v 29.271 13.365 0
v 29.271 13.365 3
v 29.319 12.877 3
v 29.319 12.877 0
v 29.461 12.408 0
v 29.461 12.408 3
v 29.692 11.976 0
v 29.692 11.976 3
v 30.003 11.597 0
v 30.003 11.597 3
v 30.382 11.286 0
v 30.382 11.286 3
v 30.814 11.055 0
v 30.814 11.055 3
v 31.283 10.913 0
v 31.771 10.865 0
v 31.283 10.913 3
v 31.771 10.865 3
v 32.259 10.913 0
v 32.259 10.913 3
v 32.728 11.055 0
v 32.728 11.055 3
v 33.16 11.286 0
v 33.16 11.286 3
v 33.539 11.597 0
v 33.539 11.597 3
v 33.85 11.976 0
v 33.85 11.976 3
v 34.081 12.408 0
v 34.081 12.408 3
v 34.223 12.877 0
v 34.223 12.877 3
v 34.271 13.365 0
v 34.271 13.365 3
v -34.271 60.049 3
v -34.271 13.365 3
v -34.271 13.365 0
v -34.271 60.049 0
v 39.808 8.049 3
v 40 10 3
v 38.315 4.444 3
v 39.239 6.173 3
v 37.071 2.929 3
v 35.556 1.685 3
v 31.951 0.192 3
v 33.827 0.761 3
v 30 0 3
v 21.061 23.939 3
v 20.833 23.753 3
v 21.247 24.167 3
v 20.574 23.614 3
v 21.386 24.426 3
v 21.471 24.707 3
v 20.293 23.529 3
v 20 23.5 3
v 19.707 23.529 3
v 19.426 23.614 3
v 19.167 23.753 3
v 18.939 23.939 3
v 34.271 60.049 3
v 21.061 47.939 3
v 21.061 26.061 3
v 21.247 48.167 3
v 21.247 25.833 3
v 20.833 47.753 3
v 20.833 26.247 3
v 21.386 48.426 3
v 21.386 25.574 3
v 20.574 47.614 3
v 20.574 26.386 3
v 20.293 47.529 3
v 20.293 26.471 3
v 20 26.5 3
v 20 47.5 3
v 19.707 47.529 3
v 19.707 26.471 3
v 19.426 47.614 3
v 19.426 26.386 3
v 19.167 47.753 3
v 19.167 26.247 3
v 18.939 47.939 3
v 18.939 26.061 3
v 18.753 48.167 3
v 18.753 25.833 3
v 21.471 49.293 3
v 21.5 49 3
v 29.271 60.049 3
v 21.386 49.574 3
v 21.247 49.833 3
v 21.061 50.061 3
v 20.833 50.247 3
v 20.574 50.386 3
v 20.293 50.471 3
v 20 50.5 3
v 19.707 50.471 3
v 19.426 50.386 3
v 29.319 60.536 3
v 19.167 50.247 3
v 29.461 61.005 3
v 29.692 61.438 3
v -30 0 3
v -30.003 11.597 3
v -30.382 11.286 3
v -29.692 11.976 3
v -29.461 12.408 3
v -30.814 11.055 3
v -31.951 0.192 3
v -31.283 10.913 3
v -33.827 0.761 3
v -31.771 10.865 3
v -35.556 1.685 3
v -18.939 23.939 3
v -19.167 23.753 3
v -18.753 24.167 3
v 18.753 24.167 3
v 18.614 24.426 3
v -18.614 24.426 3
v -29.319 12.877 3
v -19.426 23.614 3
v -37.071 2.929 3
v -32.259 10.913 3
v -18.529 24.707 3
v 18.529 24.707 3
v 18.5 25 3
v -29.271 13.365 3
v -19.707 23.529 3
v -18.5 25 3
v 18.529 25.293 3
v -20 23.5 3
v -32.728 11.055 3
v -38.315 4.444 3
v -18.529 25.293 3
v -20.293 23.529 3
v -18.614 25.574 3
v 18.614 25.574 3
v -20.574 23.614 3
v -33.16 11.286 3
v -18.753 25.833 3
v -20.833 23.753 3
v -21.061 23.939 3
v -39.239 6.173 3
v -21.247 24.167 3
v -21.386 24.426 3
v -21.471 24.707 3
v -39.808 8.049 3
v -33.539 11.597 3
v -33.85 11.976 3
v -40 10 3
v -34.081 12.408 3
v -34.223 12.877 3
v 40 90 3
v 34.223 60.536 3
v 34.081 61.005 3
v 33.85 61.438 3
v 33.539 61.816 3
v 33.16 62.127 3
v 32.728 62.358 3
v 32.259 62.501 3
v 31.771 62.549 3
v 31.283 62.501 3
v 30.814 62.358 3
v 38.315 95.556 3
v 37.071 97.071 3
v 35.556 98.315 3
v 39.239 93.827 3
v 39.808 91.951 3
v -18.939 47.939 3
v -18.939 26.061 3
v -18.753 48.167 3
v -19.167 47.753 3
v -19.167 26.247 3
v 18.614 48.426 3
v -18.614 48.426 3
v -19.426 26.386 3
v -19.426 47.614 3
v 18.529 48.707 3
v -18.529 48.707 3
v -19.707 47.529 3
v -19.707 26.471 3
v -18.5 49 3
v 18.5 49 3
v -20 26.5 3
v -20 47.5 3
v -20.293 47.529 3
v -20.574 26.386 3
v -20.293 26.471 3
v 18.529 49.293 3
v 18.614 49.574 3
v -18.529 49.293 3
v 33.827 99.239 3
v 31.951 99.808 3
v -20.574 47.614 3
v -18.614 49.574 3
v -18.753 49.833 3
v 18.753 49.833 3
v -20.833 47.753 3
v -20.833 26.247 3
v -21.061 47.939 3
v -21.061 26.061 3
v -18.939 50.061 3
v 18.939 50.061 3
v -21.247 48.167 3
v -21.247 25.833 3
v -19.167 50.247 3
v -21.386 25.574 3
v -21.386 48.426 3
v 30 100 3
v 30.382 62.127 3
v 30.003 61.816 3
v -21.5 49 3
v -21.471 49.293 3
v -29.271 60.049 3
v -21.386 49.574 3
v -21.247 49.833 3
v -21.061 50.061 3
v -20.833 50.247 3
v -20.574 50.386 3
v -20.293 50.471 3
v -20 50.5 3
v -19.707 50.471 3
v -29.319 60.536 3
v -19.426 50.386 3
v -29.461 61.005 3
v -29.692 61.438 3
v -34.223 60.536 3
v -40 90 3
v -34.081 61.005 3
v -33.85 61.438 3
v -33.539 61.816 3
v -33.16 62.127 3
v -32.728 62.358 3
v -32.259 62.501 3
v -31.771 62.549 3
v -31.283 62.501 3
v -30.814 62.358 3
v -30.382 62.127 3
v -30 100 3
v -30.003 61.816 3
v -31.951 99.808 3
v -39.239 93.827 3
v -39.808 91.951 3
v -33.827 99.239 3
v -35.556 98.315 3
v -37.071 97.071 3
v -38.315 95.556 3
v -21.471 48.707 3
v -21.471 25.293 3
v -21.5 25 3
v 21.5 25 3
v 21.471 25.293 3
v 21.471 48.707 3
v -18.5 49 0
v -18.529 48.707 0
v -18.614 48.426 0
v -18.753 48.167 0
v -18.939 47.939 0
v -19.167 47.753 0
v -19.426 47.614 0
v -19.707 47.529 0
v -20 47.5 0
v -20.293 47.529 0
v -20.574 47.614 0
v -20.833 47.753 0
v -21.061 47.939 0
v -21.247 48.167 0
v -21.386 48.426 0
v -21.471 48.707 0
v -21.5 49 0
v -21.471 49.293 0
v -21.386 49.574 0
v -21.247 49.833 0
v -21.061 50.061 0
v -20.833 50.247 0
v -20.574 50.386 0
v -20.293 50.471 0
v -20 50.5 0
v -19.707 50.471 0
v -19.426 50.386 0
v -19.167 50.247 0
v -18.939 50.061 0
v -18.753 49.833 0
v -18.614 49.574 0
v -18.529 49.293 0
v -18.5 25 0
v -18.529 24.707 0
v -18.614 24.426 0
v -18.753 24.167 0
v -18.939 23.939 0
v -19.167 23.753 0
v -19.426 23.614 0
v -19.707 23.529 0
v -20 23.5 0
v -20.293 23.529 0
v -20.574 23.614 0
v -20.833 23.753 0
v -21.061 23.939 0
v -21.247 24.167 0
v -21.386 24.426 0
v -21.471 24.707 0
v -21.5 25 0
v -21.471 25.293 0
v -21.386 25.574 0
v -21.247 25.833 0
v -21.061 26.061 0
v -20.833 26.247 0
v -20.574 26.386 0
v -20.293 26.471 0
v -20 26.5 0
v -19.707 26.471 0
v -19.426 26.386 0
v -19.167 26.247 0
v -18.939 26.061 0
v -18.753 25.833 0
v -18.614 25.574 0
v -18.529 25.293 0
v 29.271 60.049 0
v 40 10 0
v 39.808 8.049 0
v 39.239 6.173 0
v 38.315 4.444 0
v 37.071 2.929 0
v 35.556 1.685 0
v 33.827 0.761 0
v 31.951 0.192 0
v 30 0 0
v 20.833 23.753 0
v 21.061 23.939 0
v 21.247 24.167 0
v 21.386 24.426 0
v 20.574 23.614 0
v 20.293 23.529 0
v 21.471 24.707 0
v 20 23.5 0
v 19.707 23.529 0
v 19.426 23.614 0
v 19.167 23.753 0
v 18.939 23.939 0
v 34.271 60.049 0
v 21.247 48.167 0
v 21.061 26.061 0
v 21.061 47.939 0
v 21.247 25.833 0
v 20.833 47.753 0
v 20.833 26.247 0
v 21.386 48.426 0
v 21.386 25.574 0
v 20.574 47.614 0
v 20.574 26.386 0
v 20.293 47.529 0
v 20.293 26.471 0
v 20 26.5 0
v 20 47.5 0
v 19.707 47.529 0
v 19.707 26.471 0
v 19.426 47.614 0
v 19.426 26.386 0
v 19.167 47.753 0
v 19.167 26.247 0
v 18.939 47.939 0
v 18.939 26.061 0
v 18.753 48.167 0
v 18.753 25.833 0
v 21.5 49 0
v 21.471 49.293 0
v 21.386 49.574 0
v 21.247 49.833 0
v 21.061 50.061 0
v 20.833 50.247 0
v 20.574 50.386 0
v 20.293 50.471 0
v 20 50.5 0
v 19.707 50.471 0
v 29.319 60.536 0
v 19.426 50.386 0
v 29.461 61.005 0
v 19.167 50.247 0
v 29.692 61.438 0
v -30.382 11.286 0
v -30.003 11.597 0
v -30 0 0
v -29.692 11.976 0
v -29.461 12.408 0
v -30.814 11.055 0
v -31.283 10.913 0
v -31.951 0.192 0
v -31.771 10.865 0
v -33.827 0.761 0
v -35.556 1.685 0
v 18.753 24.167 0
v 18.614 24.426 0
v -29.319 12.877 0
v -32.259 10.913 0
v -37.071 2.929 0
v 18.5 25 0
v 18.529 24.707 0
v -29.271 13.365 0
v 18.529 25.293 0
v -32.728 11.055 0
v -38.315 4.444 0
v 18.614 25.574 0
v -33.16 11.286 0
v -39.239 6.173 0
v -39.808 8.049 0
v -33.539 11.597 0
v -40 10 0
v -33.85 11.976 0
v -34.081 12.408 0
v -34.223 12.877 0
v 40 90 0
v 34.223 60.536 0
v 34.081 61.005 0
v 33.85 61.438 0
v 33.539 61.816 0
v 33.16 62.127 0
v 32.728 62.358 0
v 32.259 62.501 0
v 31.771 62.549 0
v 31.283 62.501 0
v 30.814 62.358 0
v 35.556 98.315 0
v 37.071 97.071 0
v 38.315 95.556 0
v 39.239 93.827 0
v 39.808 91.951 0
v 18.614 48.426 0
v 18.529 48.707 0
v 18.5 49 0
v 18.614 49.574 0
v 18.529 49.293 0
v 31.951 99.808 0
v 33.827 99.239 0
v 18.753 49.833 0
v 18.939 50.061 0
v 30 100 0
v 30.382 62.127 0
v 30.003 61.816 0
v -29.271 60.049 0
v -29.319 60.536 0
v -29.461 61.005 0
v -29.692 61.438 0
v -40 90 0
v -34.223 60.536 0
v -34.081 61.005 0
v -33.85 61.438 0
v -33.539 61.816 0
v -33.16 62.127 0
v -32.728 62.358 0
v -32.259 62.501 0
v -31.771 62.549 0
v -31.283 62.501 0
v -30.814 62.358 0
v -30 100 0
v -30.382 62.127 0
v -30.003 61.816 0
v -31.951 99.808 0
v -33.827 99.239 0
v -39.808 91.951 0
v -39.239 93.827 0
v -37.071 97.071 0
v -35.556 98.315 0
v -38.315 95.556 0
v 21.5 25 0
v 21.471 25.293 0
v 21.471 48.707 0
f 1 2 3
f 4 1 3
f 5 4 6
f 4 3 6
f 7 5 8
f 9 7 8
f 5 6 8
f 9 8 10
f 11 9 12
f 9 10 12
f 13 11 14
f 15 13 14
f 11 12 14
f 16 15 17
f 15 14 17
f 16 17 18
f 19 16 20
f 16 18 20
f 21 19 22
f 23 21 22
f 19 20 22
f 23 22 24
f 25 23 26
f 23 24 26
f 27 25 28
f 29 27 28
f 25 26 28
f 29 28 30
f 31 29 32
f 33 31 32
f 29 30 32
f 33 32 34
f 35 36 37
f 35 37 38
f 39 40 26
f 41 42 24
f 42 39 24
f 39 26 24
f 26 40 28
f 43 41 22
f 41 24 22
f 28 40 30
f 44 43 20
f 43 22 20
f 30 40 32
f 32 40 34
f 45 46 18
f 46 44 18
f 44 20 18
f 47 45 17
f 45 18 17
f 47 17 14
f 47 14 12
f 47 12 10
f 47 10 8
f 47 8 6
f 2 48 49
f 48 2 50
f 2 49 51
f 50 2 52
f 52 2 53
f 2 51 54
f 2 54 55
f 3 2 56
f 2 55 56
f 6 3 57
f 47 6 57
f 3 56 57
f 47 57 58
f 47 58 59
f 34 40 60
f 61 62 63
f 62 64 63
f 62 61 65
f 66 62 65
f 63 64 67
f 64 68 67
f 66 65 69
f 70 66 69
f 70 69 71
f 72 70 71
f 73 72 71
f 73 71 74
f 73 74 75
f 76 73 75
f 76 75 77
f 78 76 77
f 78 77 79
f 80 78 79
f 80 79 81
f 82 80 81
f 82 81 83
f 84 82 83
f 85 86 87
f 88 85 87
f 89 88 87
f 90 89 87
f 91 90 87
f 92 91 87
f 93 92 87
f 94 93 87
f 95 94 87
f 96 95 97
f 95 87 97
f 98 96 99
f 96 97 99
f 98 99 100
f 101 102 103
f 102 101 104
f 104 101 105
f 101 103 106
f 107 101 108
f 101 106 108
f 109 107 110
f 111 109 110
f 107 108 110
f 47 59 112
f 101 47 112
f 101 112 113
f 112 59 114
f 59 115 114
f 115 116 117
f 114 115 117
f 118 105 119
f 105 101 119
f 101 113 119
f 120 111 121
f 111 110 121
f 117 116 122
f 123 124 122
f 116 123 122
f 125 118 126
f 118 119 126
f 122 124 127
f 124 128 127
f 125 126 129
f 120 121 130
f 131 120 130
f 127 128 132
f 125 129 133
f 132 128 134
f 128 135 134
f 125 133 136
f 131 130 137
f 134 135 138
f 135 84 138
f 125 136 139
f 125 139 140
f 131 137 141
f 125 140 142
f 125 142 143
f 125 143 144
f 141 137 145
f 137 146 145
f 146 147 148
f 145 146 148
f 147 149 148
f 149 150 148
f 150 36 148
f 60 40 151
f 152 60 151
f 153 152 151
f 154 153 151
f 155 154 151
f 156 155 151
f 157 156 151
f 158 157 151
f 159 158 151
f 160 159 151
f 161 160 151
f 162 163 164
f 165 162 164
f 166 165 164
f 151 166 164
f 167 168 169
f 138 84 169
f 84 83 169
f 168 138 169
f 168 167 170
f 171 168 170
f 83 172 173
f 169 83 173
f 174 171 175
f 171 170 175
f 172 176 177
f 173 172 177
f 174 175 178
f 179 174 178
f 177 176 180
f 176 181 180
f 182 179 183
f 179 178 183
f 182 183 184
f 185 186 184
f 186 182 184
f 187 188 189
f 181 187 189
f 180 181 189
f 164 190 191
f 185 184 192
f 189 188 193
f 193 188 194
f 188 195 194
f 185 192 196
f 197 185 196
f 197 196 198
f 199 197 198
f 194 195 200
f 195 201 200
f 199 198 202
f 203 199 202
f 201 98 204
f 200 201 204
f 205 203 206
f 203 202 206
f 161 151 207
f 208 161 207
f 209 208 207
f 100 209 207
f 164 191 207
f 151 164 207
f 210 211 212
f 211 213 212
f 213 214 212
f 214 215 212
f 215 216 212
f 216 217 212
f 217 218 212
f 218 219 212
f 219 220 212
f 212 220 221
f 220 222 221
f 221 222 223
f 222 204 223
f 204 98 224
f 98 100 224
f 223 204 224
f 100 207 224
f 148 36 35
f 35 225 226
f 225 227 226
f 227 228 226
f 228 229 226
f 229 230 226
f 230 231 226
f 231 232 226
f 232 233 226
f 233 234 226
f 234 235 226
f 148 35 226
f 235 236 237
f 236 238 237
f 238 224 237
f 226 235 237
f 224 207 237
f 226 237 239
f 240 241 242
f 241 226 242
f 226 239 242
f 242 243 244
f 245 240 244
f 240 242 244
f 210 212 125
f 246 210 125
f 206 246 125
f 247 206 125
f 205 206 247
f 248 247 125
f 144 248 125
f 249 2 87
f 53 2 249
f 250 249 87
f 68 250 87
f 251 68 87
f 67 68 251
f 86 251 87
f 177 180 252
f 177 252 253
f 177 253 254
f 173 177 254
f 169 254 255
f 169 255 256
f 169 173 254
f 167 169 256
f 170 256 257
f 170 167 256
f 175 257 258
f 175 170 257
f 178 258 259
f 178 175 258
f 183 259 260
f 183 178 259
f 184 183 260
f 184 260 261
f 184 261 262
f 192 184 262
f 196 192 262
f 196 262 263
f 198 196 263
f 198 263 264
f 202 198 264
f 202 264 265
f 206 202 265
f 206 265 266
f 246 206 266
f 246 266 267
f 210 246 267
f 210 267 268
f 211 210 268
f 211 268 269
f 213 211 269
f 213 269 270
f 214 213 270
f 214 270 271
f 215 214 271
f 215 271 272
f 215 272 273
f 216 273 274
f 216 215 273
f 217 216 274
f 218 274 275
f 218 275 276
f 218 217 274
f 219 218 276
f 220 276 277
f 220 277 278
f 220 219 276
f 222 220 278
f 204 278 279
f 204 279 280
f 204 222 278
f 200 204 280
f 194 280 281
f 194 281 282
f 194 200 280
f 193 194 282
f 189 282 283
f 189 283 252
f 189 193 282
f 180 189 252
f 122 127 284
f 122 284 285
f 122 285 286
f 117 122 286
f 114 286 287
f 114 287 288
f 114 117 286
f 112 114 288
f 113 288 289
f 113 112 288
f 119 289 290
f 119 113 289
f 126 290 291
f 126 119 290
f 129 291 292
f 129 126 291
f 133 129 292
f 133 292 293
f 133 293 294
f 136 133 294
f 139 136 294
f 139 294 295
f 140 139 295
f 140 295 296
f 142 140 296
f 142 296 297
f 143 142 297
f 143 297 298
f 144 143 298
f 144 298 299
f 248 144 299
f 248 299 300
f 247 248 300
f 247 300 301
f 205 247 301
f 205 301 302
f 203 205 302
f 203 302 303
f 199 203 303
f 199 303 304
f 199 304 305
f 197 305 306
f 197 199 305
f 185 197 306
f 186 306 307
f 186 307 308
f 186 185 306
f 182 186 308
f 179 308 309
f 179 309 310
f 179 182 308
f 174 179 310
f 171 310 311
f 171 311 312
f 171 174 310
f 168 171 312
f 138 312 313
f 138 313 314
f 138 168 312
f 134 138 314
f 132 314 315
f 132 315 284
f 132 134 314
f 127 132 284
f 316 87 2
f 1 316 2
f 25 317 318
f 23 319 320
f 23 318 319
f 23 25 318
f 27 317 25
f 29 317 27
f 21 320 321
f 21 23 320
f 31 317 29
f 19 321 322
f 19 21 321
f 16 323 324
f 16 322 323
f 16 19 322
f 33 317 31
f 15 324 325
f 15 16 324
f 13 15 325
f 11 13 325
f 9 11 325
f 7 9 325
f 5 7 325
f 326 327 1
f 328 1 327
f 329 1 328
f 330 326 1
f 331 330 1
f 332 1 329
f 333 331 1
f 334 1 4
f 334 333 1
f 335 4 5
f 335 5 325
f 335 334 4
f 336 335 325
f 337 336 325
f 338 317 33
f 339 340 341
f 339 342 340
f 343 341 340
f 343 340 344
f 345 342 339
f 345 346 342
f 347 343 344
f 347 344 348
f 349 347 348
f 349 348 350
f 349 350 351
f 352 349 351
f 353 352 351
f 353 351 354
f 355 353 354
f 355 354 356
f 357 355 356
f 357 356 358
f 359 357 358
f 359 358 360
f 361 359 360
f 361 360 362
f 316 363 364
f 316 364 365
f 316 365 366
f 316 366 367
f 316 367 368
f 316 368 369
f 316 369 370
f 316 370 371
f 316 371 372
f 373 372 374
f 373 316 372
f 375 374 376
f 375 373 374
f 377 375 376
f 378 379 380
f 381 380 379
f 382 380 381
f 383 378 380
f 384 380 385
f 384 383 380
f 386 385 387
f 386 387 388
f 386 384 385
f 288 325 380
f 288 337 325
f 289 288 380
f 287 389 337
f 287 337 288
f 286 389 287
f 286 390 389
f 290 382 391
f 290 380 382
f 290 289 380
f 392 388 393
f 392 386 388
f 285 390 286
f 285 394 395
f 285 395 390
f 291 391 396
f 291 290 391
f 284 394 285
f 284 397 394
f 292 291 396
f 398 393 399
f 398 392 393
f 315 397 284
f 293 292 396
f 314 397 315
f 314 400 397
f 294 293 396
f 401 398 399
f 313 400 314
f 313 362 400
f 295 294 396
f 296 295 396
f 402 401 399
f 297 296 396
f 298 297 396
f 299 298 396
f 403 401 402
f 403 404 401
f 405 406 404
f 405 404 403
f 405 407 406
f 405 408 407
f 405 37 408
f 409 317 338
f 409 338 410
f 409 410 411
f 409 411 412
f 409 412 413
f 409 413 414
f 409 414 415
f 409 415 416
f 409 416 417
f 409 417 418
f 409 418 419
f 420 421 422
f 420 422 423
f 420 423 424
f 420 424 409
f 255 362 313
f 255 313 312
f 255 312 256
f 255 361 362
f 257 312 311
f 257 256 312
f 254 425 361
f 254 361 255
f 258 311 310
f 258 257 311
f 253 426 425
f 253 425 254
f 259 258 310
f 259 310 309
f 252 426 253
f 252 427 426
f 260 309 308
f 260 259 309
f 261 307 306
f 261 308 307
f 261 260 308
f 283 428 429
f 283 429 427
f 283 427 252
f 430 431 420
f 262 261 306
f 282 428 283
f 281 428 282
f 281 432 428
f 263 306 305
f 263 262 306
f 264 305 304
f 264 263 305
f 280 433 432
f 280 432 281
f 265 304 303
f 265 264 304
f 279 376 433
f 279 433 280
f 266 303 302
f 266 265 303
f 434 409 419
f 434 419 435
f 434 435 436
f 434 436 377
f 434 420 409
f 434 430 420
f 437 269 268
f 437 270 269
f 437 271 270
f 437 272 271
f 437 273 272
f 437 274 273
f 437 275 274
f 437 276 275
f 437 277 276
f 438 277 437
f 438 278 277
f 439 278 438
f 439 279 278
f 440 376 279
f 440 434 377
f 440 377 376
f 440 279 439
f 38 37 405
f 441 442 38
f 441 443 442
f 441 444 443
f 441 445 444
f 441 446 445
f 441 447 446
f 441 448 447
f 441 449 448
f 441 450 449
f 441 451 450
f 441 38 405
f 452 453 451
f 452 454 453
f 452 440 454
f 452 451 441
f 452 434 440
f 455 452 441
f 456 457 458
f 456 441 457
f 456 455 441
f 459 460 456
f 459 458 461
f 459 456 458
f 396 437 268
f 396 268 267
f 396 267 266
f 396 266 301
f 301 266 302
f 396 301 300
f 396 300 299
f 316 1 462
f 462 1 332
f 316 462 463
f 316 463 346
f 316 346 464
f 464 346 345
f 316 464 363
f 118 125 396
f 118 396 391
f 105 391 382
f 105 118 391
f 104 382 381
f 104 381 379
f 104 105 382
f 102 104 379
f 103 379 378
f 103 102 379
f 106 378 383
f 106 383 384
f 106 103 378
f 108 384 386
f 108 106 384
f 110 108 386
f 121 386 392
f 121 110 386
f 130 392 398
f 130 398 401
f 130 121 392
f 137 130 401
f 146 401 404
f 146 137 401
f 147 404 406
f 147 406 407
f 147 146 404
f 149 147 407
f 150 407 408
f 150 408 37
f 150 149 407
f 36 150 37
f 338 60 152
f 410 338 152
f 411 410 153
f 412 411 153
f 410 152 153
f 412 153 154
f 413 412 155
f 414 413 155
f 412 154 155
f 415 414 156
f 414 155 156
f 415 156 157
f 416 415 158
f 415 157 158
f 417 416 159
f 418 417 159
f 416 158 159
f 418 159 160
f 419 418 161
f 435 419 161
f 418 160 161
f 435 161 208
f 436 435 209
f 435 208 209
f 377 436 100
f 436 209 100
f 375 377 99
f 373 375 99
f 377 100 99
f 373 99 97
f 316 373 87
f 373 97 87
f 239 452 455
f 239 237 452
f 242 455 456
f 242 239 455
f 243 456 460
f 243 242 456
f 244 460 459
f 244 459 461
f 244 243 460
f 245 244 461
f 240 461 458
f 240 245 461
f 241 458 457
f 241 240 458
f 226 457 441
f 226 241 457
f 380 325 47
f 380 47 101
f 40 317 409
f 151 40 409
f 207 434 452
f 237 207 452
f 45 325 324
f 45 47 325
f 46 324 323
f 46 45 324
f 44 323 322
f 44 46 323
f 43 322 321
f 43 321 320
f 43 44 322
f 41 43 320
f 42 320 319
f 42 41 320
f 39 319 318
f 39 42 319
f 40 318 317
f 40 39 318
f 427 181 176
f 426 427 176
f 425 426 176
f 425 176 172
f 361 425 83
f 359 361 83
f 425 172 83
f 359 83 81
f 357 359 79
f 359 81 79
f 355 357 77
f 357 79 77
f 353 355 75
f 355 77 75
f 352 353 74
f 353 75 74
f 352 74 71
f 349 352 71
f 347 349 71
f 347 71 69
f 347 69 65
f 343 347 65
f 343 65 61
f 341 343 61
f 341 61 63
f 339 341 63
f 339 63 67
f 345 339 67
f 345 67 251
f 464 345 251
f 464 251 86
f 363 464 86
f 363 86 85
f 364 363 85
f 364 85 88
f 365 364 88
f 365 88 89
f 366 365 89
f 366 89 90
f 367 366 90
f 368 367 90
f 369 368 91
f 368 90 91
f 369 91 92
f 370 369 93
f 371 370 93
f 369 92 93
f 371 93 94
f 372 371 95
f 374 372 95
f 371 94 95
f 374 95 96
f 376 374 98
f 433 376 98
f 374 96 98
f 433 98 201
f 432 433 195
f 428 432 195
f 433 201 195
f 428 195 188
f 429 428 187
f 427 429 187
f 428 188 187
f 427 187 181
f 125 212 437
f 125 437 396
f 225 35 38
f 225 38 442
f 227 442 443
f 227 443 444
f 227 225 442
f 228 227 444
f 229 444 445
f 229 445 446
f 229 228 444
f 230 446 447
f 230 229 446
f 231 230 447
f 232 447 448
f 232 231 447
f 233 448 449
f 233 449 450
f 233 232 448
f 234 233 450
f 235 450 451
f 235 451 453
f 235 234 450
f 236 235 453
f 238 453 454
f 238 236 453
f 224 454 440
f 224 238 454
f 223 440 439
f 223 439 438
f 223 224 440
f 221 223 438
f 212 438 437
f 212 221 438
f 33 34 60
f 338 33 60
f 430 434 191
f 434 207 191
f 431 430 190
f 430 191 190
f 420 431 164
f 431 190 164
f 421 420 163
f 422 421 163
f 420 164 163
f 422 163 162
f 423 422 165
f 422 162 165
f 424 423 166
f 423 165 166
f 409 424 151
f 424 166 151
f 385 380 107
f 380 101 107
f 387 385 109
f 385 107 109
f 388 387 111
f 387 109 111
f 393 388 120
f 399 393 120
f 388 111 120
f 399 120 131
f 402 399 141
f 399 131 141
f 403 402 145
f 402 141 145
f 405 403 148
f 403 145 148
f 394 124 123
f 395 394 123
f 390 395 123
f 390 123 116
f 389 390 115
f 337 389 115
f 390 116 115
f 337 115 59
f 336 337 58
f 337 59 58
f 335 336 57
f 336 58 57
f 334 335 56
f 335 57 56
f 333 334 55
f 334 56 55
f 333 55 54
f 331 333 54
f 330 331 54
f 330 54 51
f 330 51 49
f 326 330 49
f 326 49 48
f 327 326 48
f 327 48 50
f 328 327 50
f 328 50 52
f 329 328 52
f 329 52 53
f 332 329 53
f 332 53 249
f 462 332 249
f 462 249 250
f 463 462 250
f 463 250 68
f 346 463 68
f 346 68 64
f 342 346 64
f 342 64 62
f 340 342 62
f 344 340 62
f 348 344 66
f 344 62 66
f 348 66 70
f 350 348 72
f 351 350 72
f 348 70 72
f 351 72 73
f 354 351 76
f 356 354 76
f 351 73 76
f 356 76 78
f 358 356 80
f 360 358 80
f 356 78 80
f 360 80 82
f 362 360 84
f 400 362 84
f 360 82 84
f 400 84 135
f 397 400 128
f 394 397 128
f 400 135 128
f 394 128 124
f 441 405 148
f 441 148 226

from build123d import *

# Parameters (mm, degrees)
F0_W     = 40
F0_H     = 100
F1_DEPTH = 3
F3_D     = 3
F5_DEPTH = 25
F6_R     = 10


with BuildPart() as f1:
    # F0 (on Top) → F1 (new body)
    with BuildSketch(Plane.XY):
        with Locations((20, 50)):
            Rectangle(F0_W, F0_H)
    extrude(amount=F1_DEPTH)

    # F3 (through all)
    with Locations(Plane(origin=(0, 0, 0), x_dir=(1, 0, 0), z_dir=(0, 0, -1))):
        with Locations((20, -49), (20, -25)):
            Hole(F3_D / 2)

    # F4 (on face) → F5 (cut)
    with BuildSketch(Plane.XY.offset(3)):
        with BuildLine():
            ThreePointArc((34.2711234093, 60.0486546755), (31.7711234093, 62.5486546755), (29.2711234093, 60.0486546755))
            Line((29.2711234093, 60.0486546755), (29.2711234093, 13.3645236492))
            ThreePointArc((29.2711234093, 13.3645236492), (31.7711234093, 10.8645236492), (34.2711234093, 13.3645236492))
            Line((34.2711234093, 13.3645236492), (34.2711234093, 60.0486546755))
        make_face()
    extrude(amount=-F5_DEPTH, mode=Mode.SUBTRACT)

    # F6
    f6_edges = [f1.edges().sort_by_distance(p)[0] for p in [
        (40, 100, 1.5),
        (40, 0, 1.5),
    ]]
    fillet(f6_edges, radius=F6_R)

    # F7: F1 across plane


with BuildPart() as f1_1:
    add(f1.part)
    add(f1.part.mirror(Plane.YZ))


solid = f1_1.part
